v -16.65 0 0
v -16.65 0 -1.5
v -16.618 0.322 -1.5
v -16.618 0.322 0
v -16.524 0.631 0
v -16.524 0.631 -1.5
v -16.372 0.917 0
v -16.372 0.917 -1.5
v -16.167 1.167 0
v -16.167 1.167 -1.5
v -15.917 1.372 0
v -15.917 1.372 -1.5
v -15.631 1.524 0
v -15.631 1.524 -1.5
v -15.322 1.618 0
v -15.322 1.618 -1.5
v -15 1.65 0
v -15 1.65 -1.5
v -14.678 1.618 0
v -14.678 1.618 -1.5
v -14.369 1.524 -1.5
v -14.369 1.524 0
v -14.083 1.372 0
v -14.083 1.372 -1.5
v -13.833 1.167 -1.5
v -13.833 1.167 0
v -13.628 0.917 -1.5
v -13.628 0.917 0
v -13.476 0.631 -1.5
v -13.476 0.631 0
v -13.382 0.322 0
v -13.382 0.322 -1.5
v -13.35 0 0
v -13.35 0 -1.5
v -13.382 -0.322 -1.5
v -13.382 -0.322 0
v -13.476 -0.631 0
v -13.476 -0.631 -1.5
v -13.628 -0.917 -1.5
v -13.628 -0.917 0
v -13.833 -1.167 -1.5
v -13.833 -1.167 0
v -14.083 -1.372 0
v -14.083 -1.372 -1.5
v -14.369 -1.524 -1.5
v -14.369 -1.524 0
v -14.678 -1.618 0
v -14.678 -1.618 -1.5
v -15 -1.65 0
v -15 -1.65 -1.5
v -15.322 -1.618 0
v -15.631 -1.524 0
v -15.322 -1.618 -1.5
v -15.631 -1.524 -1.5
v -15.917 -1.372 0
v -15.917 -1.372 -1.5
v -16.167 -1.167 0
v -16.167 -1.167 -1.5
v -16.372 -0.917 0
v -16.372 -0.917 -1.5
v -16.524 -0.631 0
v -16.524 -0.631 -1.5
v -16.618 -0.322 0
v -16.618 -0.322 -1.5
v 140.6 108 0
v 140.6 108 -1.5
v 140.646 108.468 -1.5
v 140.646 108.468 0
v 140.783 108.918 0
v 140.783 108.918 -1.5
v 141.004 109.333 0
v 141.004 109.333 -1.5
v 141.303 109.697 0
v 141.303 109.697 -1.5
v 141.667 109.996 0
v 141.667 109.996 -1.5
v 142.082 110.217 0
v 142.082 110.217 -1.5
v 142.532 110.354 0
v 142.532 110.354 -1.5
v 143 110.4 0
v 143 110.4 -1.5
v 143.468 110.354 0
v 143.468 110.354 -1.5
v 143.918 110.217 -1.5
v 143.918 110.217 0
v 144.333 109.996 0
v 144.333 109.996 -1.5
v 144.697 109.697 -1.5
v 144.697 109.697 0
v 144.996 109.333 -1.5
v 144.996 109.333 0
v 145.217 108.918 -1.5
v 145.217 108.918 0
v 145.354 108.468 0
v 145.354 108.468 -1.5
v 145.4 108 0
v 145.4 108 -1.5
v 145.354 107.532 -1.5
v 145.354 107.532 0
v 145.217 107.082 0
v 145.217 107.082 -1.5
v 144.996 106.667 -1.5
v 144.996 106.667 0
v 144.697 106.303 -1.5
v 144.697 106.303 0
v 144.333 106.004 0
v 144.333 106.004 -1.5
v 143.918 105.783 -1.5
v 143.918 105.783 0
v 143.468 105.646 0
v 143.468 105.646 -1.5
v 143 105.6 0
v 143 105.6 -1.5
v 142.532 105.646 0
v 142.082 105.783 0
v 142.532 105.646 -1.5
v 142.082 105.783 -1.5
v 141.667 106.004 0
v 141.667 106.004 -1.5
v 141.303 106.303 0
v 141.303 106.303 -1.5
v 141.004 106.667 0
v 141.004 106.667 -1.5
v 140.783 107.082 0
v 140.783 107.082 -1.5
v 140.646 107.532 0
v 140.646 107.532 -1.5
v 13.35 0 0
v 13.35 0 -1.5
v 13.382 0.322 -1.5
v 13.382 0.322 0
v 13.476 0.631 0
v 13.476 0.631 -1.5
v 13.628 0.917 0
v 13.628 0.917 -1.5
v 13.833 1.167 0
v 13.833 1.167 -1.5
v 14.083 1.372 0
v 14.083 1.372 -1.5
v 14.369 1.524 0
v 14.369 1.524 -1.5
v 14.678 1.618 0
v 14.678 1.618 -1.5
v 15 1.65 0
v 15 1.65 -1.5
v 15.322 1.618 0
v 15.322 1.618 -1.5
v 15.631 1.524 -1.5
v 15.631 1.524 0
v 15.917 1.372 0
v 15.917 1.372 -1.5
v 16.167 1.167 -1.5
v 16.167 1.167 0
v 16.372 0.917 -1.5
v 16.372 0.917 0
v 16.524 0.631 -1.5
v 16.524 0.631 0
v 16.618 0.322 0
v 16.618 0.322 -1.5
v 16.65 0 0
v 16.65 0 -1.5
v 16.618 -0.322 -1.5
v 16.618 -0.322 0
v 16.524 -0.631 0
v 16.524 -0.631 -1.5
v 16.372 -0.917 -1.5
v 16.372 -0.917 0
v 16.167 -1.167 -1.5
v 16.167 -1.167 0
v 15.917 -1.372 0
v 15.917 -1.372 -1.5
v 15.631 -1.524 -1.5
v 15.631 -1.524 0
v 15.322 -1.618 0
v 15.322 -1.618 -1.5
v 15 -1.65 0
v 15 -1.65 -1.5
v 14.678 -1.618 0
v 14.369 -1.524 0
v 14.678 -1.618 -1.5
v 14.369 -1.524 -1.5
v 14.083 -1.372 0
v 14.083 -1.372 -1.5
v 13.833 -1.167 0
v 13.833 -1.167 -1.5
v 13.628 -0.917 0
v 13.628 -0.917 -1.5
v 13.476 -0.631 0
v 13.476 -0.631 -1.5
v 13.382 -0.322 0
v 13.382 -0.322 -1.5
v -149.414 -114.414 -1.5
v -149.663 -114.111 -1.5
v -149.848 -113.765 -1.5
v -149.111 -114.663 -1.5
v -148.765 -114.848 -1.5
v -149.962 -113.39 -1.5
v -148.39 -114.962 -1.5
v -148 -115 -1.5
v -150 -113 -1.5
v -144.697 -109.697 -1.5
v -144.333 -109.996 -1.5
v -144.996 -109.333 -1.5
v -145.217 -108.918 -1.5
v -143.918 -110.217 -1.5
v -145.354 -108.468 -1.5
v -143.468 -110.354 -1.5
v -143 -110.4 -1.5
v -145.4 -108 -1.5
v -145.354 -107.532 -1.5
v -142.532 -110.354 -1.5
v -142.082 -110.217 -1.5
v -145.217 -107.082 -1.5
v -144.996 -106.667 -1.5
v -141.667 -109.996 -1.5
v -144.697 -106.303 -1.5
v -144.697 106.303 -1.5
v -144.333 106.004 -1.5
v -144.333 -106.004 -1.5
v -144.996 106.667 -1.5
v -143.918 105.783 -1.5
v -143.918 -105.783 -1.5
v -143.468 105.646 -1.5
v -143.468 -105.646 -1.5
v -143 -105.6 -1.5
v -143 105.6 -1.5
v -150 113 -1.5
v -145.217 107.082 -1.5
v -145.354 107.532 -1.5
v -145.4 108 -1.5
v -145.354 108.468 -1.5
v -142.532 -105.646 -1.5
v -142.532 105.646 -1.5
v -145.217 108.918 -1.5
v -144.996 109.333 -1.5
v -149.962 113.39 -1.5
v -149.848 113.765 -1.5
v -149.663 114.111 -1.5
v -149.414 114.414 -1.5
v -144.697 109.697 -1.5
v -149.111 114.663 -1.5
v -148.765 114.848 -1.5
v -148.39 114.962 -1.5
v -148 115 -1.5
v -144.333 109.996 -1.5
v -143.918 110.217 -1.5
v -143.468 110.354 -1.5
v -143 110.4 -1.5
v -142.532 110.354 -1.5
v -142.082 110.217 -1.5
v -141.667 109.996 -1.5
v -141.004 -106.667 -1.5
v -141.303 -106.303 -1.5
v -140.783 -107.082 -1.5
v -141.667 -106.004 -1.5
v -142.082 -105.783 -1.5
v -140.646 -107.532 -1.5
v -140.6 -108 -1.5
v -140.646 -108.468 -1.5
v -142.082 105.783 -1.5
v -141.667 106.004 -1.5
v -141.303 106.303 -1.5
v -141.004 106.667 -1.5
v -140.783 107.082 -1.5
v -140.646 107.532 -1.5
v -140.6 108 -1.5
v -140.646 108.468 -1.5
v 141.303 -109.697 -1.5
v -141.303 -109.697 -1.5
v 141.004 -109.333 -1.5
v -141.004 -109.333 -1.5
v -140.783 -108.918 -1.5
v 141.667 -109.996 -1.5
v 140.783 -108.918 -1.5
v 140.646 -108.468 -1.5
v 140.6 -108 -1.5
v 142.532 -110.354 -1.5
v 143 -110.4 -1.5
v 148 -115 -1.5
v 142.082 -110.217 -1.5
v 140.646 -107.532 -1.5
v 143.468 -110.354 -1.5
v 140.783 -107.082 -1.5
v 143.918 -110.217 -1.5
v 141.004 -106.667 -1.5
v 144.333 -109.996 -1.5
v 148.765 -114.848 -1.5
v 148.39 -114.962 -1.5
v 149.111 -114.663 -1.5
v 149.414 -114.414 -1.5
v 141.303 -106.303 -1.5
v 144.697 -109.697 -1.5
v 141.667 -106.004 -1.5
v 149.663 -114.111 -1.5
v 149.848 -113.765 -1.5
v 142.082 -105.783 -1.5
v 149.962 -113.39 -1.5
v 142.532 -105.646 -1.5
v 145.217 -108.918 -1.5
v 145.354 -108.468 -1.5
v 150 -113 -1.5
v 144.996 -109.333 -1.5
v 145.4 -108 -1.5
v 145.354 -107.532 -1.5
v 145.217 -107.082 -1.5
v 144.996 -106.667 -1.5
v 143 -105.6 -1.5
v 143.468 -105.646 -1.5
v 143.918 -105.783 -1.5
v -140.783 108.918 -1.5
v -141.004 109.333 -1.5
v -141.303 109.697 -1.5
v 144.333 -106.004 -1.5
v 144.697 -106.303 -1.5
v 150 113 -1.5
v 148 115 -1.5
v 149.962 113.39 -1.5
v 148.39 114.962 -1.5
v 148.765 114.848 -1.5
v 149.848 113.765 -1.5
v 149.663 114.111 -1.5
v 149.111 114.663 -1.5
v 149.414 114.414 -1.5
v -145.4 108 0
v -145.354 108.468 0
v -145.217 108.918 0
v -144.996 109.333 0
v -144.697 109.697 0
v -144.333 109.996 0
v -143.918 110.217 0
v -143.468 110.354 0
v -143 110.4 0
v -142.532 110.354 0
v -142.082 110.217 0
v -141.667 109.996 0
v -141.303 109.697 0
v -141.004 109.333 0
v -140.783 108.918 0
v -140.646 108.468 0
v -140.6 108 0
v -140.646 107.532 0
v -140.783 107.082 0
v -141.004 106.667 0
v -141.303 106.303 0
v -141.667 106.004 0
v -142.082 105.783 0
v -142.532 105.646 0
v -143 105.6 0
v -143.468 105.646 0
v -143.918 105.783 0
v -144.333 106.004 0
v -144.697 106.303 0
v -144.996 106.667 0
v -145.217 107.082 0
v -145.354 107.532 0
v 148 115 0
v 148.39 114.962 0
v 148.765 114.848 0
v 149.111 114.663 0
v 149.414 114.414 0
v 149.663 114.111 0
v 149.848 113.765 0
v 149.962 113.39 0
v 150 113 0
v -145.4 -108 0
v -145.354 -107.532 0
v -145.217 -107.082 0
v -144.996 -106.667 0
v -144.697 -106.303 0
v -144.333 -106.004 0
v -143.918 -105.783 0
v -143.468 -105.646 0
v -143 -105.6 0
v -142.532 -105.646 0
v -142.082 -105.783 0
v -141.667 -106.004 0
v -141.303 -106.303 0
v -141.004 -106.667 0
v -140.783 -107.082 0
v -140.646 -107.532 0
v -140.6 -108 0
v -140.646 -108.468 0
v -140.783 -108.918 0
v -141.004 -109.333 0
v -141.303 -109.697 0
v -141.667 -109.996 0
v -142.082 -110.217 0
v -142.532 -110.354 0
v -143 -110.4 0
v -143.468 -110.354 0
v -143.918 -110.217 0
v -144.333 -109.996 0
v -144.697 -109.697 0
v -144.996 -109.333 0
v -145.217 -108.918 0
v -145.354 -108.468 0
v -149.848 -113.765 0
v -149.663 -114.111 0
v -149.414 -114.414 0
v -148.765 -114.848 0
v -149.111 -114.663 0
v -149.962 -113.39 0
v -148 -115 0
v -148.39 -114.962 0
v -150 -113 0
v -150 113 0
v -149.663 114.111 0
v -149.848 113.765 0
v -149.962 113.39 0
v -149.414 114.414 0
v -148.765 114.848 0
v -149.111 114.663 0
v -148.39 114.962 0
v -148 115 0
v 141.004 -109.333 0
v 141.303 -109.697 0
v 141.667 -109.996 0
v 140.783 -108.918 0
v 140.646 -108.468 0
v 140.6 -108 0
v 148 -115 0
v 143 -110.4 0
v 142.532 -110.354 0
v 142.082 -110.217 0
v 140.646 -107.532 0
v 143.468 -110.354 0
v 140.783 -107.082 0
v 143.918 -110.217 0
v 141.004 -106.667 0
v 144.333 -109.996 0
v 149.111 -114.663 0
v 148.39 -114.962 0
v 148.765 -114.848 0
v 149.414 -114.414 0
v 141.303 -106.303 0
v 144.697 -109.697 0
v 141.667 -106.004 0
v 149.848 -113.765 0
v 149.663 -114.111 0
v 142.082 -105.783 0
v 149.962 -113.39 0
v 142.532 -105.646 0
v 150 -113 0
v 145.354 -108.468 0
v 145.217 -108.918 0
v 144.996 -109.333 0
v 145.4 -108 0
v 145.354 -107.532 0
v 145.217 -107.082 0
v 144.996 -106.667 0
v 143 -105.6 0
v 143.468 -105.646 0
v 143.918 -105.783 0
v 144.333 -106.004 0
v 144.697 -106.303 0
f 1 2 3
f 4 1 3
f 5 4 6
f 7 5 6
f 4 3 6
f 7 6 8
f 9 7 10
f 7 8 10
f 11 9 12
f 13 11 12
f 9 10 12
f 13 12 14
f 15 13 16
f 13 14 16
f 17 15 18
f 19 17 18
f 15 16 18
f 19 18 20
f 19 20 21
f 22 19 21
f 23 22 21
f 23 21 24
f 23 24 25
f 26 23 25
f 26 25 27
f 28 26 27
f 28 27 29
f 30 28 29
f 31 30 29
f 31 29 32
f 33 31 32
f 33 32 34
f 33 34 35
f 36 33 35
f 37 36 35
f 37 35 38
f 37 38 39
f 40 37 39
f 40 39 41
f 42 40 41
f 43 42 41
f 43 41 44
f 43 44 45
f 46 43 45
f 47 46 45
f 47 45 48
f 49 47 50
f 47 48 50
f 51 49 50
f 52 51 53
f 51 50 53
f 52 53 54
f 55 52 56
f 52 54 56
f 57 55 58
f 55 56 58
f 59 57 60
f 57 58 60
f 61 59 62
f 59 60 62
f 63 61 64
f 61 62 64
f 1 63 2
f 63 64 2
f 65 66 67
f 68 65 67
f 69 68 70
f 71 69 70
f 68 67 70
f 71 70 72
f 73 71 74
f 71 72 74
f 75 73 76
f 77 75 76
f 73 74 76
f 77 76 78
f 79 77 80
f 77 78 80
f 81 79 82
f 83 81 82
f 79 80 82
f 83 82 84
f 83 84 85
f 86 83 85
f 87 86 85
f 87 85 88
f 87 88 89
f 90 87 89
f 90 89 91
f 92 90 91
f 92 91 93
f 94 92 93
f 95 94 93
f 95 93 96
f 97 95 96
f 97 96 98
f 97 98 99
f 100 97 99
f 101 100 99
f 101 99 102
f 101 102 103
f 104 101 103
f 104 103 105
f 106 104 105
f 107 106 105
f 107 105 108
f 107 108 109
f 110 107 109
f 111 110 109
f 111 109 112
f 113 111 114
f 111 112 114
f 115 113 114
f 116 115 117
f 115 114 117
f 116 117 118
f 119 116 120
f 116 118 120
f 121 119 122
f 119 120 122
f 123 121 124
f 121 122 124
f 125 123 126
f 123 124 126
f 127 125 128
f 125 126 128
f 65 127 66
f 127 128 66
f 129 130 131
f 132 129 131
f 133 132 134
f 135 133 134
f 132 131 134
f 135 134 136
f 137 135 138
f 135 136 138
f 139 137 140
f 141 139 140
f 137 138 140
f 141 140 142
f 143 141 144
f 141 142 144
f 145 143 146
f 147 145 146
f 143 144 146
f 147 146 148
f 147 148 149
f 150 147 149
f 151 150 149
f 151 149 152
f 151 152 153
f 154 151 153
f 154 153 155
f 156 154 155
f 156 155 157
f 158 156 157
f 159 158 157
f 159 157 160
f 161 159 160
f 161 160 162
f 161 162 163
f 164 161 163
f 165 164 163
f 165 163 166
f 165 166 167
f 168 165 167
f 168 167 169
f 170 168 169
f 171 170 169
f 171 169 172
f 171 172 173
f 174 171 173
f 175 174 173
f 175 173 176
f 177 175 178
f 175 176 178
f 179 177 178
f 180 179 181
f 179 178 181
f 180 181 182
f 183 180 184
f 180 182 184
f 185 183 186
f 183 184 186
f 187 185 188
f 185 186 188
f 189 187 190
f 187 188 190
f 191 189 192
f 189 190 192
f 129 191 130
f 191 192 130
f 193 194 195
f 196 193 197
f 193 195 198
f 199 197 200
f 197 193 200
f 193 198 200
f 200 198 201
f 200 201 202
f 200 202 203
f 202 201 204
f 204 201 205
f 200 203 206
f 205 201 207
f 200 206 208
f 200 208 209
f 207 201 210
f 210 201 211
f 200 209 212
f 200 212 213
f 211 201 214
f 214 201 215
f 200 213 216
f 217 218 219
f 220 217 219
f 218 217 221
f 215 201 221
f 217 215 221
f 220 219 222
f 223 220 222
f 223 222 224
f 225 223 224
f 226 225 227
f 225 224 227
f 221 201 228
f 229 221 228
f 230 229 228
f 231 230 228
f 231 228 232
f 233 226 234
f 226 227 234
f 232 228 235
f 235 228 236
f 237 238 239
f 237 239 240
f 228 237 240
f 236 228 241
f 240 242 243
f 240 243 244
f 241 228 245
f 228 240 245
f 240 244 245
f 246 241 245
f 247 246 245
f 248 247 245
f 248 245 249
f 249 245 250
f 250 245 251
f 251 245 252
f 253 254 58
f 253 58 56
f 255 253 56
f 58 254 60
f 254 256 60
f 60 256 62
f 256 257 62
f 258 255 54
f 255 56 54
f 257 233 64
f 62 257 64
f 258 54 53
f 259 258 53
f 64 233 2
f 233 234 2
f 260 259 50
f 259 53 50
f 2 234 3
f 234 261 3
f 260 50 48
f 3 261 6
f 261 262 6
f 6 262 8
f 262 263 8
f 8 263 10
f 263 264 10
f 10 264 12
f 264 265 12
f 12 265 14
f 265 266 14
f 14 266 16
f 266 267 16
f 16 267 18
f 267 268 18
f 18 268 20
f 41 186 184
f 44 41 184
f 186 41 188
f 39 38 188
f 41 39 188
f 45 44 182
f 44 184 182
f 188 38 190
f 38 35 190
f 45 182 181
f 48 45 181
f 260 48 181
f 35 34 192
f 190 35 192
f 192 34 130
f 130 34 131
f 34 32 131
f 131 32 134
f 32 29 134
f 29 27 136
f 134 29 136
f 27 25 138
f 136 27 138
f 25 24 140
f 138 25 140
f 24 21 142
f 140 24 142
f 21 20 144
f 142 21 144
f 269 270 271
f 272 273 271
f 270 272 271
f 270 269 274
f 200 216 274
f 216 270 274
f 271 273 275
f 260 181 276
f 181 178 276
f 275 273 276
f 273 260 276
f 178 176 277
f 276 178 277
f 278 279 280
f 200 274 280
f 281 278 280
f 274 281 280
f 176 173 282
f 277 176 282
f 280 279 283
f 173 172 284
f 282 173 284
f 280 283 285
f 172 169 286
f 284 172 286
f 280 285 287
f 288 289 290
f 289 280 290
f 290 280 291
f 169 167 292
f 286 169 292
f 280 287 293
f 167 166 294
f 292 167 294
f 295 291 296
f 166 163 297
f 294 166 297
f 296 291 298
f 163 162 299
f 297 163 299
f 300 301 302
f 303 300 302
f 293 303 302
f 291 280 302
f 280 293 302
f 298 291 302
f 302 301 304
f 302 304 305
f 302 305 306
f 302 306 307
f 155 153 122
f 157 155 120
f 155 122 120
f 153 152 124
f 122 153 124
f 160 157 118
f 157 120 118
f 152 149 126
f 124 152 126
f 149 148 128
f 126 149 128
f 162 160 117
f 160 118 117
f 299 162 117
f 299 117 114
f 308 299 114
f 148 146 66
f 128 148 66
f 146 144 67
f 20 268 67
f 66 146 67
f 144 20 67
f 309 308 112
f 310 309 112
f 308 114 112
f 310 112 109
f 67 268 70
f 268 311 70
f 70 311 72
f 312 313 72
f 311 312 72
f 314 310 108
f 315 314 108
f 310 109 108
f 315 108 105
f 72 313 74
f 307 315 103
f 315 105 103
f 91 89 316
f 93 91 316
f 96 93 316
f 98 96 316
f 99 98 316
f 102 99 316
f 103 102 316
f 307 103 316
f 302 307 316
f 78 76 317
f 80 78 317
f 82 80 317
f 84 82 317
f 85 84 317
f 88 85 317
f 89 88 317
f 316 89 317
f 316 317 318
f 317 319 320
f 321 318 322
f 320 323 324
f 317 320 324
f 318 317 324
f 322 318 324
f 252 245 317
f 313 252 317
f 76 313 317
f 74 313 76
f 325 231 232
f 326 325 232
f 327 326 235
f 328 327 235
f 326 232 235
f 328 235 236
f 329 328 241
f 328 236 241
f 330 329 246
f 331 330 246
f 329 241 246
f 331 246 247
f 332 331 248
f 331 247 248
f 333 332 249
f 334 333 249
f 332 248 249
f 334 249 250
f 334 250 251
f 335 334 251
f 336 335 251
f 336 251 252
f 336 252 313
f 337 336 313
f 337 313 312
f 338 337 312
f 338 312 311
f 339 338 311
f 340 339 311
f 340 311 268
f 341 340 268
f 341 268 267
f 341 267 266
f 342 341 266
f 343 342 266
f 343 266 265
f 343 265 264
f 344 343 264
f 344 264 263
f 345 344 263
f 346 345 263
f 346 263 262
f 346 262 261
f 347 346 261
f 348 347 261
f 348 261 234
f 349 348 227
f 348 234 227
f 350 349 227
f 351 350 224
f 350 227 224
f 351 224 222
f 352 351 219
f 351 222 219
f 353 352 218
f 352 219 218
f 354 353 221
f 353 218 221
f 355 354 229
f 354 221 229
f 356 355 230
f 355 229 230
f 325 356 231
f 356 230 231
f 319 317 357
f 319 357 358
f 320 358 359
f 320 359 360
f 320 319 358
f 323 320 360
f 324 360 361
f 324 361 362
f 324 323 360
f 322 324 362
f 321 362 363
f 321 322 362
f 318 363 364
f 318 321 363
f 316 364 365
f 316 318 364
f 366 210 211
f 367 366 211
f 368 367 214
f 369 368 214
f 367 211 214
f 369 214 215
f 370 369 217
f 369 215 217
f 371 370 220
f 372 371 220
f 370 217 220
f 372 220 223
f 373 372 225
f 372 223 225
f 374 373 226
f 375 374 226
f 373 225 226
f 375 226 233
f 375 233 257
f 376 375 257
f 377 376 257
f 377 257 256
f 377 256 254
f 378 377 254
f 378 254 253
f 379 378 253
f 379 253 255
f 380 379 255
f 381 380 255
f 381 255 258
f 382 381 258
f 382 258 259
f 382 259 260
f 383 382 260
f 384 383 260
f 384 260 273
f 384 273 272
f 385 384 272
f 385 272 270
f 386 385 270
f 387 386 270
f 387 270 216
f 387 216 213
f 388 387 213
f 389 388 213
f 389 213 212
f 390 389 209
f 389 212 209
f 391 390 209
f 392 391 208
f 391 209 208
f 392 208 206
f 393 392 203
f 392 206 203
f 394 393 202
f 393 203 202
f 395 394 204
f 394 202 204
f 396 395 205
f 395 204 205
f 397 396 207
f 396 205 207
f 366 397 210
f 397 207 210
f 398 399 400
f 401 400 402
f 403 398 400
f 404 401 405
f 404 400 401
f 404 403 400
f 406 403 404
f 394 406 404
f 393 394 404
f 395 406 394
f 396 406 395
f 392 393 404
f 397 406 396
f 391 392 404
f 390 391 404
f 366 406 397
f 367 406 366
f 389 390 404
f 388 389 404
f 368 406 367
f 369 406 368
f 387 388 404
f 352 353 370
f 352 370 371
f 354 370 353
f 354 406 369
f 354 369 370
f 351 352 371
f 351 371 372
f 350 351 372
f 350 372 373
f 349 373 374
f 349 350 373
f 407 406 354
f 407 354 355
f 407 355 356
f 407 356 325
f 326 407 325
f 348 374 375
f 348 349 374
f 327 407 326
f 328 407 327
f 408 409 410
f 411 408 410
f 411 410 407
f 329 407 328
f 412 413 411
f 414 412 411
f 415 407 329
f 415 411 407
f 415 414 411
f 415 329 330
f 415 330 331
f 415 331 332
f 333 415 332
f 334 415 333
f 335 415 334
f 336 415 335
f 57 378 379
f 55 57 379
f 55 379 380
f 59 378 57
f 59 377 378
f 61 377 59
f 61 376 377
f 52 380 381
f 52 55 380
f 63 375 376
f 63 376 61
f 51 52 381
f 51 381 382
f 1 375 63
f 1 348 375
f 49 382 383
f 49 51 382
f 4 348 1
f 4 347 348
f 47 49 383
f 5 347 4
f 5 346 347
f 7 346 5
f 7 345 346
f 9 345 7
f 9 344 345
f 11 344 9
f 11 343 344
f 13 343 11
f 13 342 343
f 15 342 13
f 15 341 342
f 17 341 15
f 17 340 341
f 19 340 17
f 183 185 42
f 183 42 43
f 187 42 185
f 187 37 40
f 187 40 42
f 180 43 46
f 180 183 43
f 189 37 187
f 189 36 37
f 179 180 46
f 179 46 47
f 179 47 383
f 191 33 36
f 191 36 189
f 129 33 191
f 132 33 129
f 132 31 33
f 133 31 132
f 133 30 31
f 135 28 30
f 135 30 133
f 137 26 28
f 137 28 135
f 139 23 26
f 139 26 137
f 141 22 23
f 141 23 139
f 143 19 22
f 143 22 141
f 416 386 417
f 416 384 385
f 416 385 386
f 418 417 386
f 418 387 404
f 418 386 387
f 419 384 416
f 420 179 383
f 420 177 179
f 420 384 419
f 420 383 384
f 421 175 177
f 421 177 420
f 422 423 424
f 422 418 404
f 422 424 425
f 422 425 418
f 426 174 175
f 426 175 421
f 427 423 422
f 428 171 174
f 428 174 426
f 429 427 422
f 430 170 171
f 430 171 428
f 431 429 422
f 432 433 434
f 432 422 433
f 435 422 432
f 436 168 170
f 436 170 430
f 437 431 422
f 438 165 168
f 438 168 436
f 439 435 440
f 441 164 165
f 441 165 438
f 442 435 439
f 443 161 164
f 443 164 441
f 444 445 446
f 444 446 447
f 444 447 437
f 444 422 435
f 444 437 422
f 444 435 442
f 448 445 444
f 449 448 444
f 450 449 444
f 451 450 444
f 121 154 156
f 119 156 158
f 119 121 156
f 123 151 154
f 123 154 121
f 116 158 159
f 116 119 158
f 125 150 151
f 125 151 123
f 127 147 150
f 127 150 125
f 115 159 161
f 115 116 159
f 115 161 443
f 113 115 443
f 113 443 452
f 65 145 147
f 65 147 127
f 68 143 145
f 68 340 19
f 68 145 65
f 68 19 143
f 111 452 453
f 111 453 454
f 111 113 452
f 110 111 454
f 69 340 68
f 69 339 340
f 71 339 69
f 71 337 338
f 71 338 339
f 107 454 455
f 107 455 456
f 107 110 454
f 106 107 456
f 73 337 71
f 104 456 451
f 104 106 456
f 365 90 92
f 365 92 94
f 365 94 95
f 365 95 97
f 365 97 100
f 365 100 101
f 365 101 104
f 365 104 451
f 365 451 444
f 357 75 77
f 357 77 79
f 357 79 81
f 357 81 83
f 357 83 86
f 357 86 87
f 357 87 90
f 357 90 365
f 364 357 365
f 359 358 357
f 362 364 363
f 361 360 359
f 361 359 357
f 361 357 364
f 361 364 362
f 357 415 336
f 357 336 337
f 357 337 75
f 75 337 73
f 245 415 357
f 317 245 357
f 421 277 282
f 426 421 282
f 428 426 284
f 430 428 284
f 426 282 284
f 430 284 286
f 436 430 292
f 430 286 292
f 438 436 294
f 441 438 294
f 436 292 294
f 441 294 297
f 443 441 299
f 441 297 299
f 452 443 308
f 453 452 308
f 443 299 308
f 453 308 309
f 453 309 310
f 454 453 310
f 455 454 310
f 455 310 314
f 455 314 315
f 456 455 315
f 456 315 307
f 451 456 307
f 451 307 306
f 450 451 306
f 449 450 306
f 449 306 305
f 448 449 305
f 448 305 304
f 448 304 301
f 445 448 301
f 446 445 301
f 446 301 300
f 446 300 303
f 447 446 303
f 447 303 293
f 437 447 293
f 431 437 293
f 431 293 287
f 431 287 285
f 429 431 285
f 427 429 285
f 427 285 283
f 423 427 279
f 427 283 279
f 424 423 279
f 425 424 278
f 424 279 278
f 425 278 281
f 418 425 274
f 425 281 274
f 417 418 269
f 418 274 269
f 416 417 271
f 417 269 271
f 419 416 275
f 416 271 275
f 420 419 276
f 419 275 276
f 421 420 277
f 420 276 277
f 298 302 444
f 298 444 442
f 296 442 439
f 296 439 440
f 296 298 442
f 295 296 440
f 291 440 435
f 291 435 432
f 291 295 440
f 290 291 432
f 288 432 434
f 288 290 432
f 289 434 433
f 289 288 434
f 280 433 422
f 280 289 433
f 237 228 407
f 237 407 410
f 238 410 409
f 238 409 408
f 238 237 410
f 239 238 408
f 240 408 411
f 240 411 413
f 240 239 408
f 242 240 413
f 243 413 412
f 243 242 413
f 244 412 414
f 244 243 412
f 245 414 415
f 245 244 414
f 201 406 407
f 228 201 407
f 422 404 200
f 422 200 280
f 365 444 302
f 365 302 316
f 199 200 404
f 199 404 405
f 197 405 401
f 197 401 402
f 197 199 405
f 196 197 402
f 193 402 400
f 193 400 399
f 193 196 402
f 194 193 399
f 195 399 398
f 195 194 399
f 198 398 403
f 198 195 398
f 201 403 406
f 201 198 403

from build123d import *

# Parameters (mm, degrees)
SKETCH_1_W             = 300
SKETCH_1_H             = 230
SM_BASE_FLANGE_1_DEPTH = 1.5
HOLE_WIZARD_M4_1_D     = 4.8
HOLE_WIZARD_M4_1_2_D   = 3.3
OTHER_START            = -2
OTHER_1_DEPTH          = 3


with BuildPart() as part:
    # 基体-法兰1: sheet metal written as solids
    # Sketch 1 → 基体-法兰1 (new body)
    with BuildSketch(Plane.XY):
        Rectangle(SKETCH_1_W, SKETCH_1_H)
    extrude(amount=-SM_BASE_FLANGE_1_DEPTH)

    # Hole Wizard M4 _1 (through all)
    with Locations(Plane.XY):
        with Locations((-143, 108), (143, 108), (143, -108), (-143, -108)):
            Hole(HOLE_WIZARD_M4_1_D / 2)

    # Hole Wizard M4 _1 2 (through all)
    with Locations(Plane.XY):
        with Locations((-15, 0), (15, 0)):
            Hole(HOLE_WIZARD_M4_1_2_D / 2)

    # Other 1: read off the stored shape, not the designer's step
    # Other 1 outline → Other 1 (cut)
    with BuildSketch(Plane.XY.offset(OTHER_START)):
        with BuildLine():
            ThreePointArc((150, -113), (149.414213562, -114.414213562), (148, -115))
            Line((148, -115), (150, -115))
            Line((150, -115), (150, -113))
        make_face()
        with BuildLine():
            Line((-150, -115), (-148, -115))
            ThreePointArc((-148, -115), (-149.414213562, -114.414213562), (-150, -113))
            Line((-150, -113), (-150, -115))
        make_face()
        with BuildLine():
            ThreePointArc((148, 115), (149.414213562, 114.414213562), (150, 113))
            Line((150, 113), (150, 115))
            Line((150, 115), (148, 115))
        make_face()
        with BuildLine():
            Line((-150, 115), (-150, 113))
            ThreePointArc((-150, 113), (-149.414213562, 114.414213562), (-148, 115))
            Line((-148, 115), (-150, 115))
        make_face()
    extrude(amount=OTHER_1_DEPTH, mode=Mode.SUBTRACT)


solid = part.part
